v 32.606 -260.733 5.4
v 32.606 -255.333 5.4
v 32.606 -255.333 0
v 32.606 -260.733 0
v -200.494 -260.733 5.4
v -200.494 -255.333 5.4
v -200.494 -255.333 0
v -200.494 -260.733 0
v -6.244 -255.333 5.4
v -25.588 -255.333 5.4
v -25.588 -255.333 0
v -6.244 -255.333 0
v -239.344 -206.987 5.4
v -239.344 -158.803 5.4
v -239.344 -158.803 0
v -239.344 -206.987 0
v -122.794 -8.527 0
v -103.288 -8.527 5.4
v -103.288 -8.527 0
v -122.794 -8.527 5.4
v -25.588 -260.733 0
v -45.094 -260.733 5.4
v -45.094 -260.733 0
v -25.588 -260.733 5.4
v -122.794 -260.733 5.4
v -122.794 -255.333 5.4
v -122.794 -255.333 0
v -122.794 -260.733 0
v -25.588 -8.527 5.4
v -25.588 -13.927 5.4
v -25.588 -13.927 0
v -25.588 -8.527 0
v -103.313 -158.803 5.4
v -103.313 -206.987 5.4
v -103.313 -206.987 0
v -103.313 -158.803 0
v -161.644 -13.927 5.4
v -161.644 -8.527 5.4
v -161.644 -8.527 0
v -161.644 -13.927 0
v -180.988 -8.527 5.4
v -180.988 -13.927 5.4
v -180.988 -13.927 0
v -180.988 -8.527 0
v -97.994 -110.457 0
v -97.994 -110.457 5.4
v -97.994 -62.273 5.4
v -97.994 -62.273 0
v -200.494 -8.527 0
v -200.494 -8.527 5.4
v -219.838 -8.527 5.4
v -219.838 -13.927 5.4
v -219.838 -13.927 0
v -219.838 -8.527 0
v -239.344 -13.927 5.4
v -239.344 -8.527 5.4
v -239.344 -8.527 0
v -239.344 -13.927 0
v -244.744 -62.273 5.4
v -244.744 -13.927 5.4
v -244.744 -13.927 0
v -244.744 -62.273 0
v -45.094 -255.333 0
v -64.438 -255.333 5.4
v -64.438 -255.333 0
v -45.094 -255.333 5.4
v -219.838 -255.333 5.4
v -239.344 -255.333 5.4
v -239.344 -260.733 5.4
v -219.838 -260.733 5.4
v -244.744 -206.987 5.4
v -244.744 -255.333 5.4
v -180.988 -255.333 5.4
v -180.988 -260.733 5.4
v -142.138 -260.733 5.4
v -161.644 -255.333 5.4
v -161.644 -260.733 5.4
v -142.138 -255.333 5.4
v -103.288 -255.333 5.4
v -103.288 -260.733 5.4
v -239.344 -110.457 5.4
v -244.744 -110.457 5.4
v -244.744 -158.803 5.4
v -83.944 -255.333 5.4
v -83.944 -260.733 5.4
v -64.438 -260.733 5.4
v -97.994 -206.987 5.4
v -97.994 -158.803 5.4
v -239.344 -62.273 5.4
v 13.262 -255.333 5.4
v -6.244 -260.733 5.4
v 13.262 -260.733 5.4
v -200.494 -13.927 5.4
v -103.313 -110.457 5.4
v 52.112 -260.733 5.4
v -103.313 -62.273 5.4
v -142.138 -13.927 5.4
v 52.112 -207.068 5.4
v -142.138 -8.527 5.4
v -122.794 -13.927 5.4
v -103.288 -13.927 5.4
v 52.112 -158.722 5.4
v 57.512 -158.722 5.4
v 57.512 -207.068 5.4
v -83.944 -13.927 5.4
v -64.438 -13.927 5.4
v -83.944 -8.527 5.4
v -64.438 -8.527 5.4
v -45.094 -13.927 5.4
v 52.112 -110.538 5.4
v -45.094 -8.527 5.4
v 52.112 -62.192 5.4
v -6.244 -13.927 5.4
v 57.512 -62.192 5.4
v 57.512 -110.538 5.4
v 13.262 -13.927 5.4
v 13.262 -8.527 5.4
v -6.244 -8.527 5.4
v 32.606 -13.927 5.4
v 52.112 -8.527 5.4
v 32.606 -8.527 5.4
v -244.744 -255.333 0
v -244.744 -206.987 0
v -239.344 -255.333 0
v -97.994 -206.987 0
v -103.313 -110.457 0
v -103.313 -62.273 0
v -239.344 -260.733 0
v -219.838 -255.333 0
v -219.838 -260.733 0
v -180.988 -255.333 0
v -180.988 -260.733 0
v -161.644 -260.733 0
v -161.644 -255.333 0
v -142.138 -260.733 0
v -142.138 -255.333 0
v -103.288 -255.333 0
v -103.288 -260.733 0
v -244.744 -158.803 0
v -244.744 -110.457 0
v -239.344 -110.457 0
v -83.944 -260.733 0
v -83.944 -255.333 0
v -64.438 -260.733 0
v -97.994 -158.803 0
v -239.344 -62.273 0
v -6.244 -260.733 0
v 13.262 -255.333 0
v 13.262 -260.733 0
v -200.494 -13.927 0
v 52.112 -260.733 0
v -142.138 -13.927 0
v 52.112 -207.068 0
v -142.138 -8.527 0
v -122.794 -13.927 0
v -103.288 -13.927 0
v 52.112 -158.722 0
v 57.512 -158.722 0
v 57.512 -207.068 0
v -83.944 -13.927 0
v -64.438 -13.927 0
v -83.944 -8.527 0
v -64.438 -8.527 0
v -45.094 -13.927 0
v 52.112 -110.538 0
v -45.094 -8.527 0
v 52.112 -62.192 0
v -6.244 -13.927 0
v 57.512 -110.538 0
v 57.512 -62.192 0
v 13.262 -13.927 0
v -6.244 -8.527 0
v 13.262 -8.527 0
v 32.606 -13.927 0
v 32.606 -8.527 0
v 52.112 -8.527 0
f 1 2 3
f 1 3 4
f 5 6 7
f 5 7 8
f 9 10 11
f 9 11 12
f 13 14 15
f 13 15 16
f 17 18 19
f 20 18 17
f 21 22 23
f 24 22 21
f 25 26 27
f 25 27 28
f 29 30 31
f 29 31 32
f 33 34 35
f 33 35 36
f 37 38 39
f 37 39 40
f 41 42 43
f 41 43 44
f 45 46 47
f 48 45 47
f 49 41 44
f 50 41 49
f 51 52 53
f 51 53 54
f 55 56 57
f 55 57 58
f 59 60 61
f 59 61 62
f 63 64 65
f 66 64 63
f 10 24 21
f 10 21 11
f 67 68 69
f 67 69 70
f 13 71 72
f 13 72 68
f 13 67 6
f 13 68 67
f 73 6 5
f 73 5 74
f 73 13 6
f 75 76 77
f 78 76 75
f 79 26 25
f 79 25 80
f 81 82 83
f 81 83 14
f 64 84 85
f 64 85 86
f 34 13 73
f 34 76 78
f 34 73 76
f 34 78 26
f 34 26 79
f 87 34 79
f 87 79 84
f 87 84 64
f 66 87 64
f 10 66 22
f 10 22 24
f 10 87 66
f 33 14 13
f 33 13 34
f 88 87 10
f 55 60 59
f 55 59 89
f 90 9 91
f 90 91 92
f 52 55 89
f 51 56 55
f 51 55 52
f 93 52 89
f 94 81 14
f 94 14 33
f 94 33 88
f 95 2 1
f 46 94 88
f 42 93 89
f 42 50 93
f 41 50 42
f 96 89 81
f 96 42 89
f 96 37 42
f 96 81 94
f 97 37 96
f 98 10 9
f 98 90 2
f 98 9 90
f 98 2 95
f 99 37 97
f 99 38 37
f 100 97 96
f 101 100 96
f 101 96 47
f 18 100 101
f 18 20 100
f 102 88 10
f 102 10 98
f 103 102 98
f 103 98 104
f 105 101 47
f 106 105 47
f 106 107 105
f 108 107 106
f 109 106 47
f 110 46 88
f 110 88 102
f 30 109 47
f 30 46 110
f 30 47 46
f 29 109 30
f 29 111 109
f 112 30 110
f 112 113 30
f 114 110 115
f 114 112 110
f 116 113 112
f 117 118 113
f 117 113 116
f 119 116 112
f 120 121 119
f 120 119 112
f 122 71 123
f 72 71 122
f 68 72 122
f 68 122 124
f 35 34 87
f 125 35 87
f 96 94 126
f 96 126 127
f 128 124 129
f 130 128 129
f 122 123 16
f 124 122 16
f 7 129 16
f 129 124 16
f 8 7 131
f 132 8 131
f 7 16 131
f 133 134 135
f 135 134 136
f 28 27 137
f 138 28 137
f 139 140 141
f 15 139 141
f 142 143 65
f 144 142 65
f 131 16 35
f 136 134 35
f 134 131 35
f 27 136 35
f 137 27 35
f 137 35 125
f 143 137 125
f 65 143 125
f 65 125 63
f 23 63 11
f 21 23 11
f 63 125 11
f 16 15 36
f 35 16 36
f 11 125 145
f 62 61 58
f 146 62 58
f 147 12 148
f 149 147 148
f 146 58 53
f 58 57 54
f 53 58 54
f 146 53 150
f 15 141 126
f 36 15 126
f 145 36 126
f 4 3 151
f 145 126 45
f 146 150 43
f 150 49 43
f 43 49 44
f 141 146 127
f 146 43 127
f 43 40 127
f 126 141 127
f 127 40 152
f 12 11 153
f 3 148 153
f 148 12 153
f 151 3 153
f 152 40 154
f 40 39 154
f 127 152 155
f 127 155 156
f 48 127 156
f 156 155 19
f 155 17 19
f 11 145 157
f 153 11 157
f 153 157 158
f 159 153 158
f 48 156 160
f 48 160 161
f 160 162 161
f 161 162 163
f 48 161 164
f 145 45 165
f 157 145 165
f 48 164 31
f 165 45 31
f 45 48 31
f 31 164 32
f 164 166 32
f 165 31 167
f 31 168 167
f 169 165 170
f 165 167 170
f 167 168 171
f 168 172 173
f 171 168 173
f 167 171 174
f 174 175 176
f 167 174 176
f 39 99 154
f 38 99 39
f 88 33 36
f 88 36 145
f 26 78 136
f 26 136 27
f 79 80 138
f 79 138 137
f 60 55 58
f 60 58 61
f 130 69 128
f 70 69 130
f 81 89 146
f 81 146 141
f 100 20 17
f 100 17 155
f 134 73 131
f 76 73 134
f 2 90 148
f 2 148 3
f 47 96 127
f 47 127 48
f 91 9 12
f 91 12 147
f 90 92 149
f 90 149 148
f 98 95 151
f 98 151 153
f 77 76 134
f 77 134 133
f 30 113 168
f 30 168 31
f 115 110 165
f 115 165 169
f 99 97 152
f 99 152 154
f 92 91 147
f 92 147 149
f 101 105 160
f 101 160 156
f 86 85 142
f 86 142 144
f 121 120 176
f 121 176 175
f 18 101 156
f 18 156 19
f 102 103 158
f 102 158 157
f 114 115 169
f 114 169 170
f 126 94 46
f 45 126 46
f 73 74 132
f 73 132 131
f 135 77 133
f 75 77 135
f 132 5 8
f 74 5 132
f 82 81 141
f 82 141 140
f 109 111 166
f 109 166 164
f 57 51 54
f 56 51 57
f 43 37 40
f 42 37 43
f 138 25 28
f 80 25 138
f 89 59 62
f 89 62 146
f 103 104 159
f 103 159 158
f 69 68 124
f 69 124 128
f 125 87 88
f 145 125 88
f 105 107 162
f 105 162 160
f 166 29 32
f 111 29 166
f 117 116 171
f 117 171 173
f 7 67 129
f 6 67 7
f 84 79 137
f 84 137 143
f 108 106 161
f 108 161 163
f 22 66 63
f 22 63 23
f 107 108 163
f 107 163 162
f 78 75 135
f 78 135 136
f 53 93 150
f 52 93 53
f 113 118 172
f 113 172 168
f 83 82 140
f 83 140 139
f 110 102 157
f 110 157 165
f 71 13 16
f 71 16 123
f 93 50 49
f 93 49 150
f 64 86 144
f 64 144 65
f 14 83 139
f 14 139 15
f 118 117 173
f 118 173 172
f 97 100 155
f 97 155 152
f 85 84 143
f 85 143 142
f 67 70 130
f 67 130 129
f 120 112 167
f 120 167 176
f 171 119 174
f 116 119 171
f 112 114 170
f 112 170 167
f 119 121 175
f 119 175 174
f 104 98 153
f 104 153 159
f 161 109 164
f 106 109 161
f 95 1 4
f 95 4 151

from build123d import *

# Parameters (mm, degrees)
SKETCH1_W           = 5.4
SKETCH1_H           = 48.265
BOSS_EXTRUDE1_DEPTH = 5.4
SKETCH2_W           = 5.31872
SKETCH2_H           = 48.18372
BOSS_EXTRUDE2_DEPTH = 5.4


with BuildPart() as part:
    # Sketch1 → Boss-Extrude1 (new body)
    with BuildSketch(Plane.XY):
        Polygon((-181.028382108, -13.967555325), (-181.028382108, -8.567555325), (-200.453382108, -8.567555325), (-200.453382108, -13.967555325), (-219.878382108, -13.967555325), (-219.878382108, -8.567555325), (-239.303382108, -8.567555325), (-239.303382108, -13.967555325), (-244.703382108, -13.967555325), (-244.703382108, -62.232555325), (-239.303382108, -62.232555325), (-239.303382108, -110.497555325), (-244.703382108, -110.497555325), (-244.703382108, -158.762555325), (-239.303382108, -158.762555325), (-239.303382108, -207.027555325), (-244.703382109, -207.027555325), (-244.703382109, -255.292555325), (-239.303382108, -255.292555325), (-239.303382108, -260.692555325), (-219.878382108, -260.692555325), (-219.878382108, -255.292555325), (-200.453382108, -255.292555325), (-200.453382108, -260.692555325), (-181.028382108, -260.692555325), (-181.028382108, -255.292555325), (-161.603382108, -255.292555325), (-161.603382108, -260.692555325), (-142.178382108, -260.692555325), (-142.178382108, -255.292555325), (-122.753382108, -255.292555325), (-122.753382108, -260.692555325), (-103.328382108, -260.692555325), (-103.328382108, -255.292555325), (-83.903382108, -255.292555325), (-83.903382108, -260.692555325), (-64.478382108, -260.692555325), (-64.478382108, -255.292555325), (-45.053382108, -255.292555325), (-45.053382108, -260.692555325), (-25.628382108, -260.692555325), (-25.628382108, -255.292555325), (-6.203382108, -255.292555325), (-6.203382108, -260.692555325), (13.221617892, -260.692555325), (13.221617892, -255.292555325), (32.646617892, -255.292555325), (32.646617892, -260.692555325), (52.071617892, -260.692555325), (52.071617892, -207.027555325), (57.471617892, -207.027555325), (57.471617892, -158.762555325), (52.071617892, -158.762555325), (52.071617892, -110.497555325), (57.471617892, -110.497555325), (57.471617892, -62.232555325), (52.071617892, -62.232555325), (52.071617892, -8.567555325), (32.646617892, -8.567555325), (32.646617892, -13.967555325), (13.221617892, -13.967555325), (13.221617892, -8.567555325), (-6.203382108, -8.567555325), (-6.203382108, -13.967555325), (-25.628382108, -13.967555325), (-25.628382108, -8.567555325), (-45.053382108, -8.567555325), (-45.053382108, -13.967555325), (-64.478382108, -13.967555325), (-64.478382108, -8.567555325), (-83.903382108, -8.567555325), (-83.903382108, -13.967555325), (-103.328382108, -13.967555325), (-103.328382108, -8.567555325), (-122.753382108, -8.567555325), (-122.753382108, -13.967555325), (-142.178382108, -13.967555325), (-142.178382108, -8.567555325), (-161.603382108, -8.567555325), (-161.603382108, -13.967555325), align=None)
        with Locations((-100.653382108, -182.895055325)):
            Rectangle(SKETCH1_W, SKETCH1_H, mode=Mode.SUBTRACT)
        with Locations((-100.653382108, -86.365055325)):
            Rectangle(SKETCH1_W, SKETCH1_H, mode=Mode.SUBTRACT)
    extrude(amount=BOSS_EXTRUDE1_DEPTH)

    # Sketch2 → Boss-Extrude2 (add)
    with BuildSketch(Plane.XY.offset(5.4)):
        Polygon((-239.344022108, -8.526915325), (-239.344022108, -13.926915325), (-244.744022108, -13.926915325), (-244.744022108, -62.273195325), (-239.344022108, -62.273195325), (-239.344022108, -110.456915325), (-244.744022108, -110.456915325), (-244.744022108, -158.803195325), (-239.344022108, -158.803195325), (-239.344022108, -206.986915325), (-244.744022109, -206.986915325), (-244.744022109, -255.333195325), (-239.344022108, -255.333195325), (-239.344022108, -260.733195325), (-219.837742108, -260.733195325), (-219.837742108, -255.333195325), (-200.494022108, -255.333195325), (-200.494022108, -260.733195325), (-180.987742108, -260.733195325), (-180.987742108, -255.333195325), (-161.644022108, -255.333195325), (-161.644022108, -260.733195325), (-142.137742108, -260.733195325), (-142.137742108, -255.333195325), (-122.794022108, -255.333195325), (-122.794022108, -260.733195325), (-103.287742108, -260.733195325), (-103.287742108, -255.333195325), (-83.944022108, -255.333195325), (-83.944022108, -260.733195325), (-64.437742108, -260.733195325), (-64.437742108, -255.333195325), (-45.094022108, -255.333195325), (-45.094022108, -260.733195325), (-25.587742108, -260.733195325), (-25.587742108, -255.333195325), (-6.244022108, -255.333195325), (-6.244022108, -260.733195325), (13.262257892, -260.733195325), (13.262257892, -255.333195325), (32.605977892, -255.333195325), (32.605977892, -260.733195325), (52.112257892, -260.733195325), (52.112257892, -207.068195325), (57.512257892, -207.068195325), (57.512257892, -158.721915325), (52.112257892, -158.721915325), (52.112257892, -110.538195325), (57.512257892, -110.538195325), (57.512257892, -62.191915325), (52.112257892, -62.191915325), (52.112257892, -8.526915325), (32.605977892, -8.526915325), (32.605977892, -13.926915325), (13.262257892, -13.926915325), (13.262257892, -8.526915325), (-6.244022108, -8.526915325), (-6.244022108, -13.926915325), (-25.587742108, -13.926915325), (-25.587742108, -8.526915325), (-45.094022108, -8.526915325), (-45.094022108, -13.926915325), (-64.437742108, -13.926915325), (-64.437742108, -8.526915325), (-83.944022108, -8.526915325), (-83.944022108, -13.926915325), (-103.287742108, -13.926915325), (-103.287742108, -8.526915325), (-122.794022108, -8.526915325), (-122.794022108, -13.926915325), (-142.137742108, -13.926915325), (-142.137742108, -8.526915325), (-161.644022108, -8.526915325), (-161.644022108, -13.926915325), (-180.987742108, -13.926915325), (-180.987742108, -8.526915325), (-200.494022108, -8.526915325), (-200.494022108, -13.926915325), (-219.837742108, -13.926915325), (-219.837742108, -8.526915325), align=None)
        with Locations((-100.653382108, -86.365055325)):
            Rectangle(SKETCH2_W, SKETCH2_H, mode=Mode.SUBTRACT)
        with Locations((-100.653382108, -182.895055325)):
            Rectangle(SKETCH2_W, SKETCH2_H, mode=Mode.SUBTRACT)
    extrude(amount=-BOSS_EXTRUDE2_DEPTH)


solid = part.part
